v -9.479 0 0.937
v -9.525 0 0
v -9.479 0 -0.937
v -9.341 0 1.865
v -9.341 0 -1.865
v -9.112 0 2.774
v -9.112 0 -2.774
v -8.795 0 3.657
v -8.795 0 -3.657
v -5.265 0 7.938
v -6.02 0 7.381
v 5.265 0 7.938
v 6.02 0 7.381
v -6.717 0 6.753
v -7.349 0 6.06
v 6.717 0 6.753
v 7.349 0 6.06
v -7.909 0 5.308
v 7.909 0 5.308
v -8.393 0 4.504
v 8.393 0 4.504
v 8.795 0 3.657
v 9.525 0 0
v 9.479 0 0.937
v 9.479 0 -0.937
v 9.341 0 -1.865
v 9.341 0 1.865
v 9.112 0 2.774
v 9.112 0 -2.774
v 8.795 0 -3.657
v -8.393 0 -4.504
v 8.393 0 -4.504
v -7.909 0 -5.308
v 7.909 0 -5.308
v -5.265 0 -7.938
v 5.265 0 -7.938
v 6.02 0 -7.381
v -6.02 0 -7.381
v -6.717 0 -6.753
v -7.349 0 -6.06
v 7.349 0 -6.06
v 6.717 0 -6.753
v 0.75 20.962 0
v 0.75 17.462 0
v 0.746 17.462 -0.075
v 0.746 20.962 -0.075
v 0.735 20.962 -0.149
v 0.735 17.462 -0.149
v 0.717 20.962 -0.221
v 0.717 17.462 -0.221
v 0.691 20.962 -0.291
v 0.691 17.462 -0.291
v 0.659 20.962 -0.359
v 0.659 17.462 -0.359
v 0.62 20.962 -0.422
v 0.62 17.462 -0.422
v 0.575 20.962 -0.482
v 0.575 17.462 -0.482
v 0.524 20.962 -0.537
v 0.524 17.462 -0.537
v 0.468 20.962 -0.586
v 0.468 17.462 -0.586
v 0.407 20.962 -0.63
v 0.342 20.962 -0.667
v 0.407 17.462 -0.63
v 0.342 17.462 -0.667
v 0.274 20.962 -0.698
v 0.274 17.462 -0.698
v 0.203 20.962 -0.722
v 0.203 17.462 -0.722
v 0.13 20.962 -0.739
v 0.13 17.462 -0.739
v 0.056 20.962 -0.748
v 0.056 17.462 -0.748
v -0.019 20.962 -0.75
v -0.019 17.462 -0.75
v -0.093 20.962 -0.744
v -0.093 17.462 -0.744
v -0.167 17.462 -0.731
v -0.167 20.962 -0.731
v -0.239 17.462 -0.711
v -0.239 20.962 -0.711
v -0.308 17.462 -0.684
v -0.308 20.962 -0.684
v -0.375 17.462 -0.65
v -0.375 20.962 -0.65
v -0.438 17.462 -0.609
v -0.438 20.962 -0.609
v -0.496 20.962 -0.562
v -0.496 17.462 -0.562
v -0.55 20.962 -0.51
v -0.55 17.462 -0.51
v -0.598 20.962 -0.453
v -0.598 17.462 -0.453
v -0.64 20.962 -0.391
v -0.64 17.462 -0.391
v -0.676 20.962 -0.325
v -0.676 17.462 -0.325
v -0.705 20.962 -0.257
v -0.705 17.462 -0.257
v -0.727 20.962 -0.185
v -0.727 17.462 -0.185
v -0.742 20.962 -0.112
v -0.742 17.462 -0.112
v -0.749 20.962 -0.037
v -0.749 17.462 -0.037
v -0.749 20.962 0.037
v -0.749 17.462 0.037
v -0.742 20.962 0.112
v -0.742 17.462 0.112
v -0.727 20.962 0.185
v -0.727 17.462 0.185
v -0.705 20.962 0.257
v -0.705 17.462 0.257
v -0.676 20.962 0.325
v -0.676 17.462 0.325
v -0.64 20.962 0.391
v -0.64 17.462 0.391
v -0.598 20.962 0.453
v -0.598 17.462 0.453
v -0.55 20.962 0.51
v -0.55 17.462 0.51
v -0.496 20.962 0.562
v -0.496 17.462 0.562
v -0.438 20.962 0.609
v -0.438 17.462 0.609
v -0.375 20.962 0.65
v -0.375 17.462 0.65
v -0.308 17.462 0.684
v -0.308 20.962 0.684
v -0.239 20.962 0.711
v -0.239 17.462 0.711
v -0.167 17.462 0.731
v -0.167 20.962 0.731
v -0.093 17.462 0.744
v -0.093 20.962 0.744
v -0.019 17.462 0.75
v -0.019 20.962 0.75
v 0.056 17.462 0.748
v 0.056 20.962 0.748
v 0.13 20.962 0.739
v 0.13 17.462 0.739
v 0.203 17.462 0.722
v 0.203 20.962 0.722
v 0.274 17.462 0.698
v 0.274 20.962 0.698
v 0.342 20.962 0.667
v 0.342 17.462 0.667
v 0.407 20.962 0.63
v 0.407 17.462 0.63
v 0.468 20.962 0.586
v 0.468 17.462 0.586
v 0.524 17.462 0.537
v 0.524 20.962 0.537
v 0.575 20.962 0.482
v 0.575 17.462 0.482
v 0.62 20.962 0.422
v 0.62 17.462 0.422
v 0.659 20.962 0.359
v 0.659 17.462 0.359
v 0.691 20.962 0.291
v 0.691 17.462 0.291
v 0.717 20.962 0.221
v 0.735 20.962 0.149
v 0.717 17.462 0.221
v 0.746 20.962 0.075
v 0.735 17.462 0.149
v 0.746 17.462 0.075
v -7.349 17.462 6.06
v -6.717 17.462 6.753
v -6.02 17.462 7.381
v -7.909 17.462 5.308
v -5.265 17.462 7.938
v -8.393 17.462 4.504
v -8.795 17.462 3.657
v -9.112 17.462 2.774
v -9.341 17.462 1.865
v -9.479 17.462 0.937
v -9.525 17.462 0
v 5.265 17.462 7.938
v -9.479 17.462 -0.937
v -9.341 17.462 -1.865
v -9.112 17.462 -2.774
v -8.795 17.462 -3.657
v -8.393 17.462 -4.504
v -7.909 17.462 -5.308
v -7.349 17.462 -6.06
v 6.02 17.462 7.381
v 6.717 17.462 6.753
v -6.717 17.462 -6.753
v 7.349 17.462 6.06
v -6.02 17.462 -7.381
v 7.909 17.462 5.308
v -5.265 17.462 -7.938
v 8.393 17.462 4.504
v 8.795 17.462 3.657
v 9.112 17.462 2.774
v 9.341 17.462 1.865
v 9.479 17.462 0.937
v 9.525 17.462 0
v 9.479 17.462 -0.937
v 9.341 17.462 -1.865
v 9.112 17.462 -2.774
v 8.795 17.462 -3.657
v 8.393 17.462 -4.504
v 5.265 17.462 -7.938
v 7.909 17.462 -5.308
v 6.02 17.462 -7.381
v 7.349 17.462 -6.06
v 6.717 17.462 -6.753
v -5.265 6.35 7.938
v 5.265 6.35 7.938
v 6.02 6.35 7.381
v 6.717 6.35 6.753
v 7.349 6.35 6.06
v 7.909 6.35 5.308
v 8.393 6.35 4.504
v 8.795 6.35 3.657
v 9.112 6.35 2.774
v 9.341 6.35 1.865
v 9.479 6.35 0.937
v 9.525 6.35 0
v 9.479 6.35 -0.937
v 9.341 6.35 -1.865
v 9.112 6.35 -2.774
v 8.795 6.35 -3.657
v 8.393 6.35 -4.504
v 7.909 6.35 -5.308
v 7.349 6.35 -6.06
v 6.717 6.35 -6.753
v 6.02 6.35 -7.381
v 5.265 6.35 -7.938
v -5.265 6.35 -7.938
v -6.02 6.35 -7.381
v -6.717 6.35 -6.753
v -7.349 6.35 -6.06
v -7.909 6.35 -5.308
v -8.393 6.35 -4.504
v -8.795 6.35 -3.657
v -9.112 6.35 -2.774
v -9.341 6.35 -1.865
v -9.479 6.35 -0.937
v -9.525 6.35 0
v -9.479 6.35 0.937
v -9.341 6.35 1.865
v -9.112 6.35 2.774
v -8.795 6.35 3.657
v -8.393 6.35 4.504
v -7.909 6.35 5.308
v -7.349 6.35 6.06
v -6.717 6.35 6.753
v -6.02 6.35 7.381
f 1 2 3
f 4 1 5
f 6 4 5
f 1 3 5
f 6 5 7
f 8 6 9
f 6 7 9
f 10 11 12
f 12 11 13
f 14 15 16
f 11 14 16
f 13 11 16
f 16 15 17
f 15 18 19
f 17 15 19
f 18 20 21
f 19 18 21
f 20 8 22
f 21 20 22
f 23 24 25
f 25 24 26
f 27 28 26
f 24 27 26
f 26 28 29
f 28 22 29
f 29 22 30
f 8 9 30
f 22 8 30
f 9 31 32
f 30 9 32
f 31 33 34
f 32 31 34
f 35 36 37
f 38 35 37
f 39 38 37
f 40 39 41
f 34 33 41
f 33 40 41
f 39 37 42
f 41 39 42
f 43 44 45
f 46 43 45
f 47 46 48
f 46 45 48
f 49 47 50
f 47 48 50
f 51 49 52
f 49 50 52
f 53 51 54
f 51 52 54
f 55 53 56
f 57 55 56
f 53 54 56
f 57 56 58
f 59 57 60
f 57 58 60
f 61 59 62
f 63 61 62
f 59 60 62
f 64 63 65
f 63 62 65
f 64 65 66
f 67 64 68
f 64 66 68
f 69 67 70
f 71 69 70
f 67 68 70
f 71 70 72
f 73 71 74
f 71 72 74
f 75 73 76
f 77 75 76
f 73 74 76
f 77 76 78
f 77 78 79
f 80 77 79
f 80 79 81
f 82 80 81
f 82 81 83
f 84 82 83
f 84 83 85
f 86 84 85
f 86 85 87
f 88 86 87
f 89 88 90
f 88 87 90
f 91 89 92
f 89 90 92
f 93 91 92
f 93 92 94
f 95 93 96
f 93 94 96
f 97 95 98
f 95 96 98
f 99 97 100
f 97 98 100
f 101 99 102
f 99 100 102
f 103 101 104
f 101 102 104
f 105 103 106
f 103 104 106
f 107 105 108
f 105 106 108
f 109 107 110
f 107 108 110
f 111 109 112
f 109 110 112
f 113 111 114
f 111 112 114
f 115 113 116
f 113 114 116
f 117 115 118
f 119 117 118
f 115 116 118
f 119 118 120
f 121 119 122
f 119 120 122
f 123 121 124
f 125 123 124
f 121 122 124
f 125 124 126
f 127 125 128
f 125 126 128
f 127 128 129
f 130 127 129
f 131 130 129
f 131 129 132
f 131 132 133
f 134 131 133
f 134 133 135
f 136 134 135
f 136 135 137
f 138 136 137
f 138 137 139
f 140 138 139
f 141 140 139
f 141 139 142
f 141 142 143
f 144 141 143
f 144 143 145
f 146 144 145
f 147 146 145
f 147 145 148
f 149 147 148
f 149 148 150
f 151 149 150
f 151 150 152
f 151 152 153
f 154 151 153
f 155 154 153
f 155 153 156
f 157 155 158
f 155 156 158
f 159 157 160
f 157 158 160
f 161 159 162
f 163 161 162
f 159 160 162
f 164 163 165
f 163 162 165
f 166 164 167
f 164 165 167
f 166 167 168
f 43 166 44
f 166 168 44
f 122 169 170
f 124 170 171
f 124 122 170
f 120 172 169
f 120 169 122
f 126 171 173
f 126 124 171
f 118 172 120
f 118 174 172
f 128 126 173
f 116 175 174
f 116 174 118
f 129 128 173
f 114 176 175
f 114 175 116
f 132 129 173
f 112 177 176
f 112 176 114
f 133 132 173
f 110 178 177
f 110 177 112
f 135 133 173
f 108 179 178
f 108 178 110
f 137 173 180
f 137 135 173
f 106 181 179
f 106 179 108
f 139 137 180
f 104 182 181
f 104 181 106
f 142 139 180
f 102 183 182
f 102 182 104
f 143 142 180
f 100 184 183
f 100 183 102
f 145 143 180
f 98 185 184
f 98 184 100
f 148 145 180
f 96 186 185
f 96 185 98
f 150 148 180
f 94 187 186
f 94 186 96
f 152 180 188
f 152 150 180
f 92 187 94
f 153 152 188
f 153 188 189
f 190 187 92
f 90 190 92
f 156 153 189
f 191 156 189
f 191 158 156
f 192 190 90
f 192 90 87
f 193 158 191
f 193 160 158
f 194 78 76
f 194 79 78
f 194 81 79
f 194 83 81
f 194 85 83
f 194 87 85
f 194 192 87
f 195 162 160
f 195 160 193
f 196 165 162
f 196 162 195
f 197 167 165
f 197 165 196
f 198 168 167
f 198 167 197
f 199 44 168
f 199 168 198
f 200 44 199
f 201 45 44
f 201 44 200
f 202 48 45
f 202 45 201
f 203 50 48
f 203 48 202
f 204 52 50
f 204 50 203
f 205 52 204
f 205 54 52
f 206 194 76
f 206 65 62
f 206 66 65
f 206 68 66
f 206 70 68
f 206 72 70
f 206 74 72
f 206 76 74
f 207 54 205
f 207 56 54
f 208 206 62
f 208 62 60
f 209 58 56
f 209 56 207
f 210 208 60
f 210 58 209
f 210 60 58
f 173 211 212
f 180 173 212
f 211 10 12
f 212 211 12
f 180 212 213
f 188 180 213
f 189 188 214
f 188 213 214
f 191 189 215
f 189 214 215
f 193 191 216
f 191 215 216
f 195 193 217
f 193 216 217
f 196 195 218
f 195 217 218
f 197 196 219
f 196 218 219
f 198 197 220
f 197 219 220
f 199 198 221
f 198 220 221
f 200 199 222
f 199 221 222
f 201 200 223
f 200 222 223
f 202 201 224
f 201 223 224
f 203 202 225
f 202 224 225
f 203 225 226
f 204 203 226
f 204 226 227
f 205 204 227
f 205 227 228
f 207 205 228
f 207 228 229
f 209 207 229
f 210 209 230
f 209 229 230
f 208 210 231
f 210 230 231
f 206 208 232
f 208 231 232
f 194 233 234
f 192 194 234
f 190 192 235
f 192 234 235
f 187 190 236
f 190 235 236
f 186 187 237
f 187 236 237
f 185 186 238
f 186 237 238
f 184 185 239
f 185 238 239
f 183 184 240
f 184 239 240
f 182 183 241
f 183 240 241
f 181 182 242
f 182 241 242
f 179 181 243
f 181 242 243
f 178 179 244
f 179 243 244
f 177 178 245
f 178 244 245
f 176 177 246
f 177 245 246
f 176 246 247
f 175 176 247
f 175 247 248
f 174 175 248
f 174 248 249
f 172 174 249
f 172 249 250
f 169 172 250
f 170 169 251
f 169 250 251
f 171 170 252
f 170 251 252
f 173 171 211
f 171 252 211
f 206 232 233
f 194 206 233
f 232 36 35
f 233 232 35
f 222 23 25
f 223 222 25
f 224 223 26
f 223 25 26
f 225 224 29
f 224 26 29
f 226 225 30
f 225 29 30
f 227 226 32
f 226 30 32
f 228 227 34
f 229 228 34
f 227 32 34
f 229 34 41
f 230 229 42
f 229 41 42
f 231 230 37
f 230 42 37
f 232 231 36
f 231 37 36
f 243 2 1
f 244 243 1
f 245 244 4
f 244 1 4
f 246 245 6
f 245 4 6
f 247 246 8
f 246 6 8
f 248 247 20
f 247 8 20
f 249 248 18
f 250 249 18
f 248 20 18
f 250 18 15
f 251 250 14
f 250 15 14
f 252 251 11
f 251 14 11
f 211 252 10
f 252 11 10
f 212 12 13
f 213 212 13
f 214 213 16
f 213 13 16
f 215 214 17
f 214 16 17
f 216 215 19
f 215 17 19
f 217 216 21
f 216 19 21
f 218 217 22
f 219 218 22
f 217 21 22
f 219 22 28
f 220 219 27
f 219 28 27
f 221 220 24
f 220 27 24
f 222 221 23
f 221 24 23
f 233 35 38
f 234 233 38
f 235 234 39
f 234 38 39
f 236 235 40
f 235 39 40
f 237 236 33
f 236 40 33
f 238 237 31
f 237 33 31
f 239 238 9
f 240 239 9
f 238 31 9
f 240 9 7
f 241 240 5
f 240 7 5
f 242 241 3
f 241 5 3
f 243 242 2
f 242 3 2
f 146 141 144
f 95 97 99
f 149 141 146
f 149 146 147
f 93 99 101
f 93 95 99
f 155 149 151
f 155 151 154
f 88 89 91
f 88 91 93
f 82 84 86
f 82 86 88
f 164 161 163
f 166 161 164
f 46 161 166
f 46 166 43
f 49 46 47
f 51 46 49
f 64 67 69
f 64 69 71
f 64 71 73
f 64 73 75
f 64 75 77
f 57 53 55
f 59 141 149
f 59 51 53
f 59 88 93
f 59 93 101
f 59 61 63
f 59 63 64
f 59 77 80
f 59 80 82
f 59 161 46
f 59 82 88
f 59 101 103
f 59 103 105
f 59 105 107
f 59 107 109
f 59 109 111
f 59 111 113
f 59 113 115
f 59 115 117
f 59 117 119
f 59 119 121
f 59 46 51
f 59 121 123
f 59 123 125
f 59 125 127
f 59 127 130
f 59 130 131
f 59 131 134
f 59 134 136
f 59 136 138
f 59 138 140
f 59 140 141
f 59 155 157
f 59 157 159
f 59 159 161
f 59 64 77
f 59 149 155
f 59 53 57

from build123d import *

# Parameters (mm, degrees)
BOSS_EXTRUDE1_DEPTH = 6.35
BOSS_EXTRUDE2_DEPTH = 11.1125
SKETCH3_R           = 0.75
BOSS_EXTRUDE3_DEPTH = 3.5


with BuildPart() as part:
    # Sketch1 → Boss-Extrude1 (new body)
    with BuildSketch(Plane(origin=(0, 0, 0), x_dir=(1, 0, 0), z_dir=(0, 1, 0))):
        with BuildLine():
            Line((5.265141855, 7.9375), (-5.265141855, 7.9375))
            ThreePointArc((-5.265141855, 7.9375), (-9.525, 0), (-5.265141855, -7.9375))
            Line((-5.265141855, -7.9375), (5.265141855, -7.9375))
            ThreePointArc((5.265141855, -7.9375), (9.525, 0), (5.265141855, 7.9375))
        make_face()
    extrude(amount=BOSS_EXTRUDE1_DEPTH)

    # Sketch2 → Boss-Extrude2 (add)
    with BuildSketch(Plane(origin=(0, 6.35, 0), x_dir=(1, 0, 0), z_dir=(0, 1, 0))):
        with BuildLine():
            Line((5.265141855, 7.9375), (-5.265141855, 7.9375))
            ThreePointArc((-5.265141855, 7.9375), (-9.525, 0), (-5.265141855, -7.9375))
            Line((-5.265141855, -7.9375), (5.265141855, -7.9375))
            ThreePointArc((5.265141855, -7.9375), (9.525, 0), (5.265141855, 7.9375))
        make_face()
    extrude(amount=BOSS_EXTRUDE2_DEPTH)

    # Sketch3 → Boss-Extrude3 (add)
    with BuildSketch(Plane(origin=(0, 17.4625, 0), x_dir=(1, 0, 0), z_dir=(0, 1, 0))):
        Circle(SKETCH3_R)
    extrude(amount=BOSS_EXTRUDE3_DEPTH)


solid = part.part
